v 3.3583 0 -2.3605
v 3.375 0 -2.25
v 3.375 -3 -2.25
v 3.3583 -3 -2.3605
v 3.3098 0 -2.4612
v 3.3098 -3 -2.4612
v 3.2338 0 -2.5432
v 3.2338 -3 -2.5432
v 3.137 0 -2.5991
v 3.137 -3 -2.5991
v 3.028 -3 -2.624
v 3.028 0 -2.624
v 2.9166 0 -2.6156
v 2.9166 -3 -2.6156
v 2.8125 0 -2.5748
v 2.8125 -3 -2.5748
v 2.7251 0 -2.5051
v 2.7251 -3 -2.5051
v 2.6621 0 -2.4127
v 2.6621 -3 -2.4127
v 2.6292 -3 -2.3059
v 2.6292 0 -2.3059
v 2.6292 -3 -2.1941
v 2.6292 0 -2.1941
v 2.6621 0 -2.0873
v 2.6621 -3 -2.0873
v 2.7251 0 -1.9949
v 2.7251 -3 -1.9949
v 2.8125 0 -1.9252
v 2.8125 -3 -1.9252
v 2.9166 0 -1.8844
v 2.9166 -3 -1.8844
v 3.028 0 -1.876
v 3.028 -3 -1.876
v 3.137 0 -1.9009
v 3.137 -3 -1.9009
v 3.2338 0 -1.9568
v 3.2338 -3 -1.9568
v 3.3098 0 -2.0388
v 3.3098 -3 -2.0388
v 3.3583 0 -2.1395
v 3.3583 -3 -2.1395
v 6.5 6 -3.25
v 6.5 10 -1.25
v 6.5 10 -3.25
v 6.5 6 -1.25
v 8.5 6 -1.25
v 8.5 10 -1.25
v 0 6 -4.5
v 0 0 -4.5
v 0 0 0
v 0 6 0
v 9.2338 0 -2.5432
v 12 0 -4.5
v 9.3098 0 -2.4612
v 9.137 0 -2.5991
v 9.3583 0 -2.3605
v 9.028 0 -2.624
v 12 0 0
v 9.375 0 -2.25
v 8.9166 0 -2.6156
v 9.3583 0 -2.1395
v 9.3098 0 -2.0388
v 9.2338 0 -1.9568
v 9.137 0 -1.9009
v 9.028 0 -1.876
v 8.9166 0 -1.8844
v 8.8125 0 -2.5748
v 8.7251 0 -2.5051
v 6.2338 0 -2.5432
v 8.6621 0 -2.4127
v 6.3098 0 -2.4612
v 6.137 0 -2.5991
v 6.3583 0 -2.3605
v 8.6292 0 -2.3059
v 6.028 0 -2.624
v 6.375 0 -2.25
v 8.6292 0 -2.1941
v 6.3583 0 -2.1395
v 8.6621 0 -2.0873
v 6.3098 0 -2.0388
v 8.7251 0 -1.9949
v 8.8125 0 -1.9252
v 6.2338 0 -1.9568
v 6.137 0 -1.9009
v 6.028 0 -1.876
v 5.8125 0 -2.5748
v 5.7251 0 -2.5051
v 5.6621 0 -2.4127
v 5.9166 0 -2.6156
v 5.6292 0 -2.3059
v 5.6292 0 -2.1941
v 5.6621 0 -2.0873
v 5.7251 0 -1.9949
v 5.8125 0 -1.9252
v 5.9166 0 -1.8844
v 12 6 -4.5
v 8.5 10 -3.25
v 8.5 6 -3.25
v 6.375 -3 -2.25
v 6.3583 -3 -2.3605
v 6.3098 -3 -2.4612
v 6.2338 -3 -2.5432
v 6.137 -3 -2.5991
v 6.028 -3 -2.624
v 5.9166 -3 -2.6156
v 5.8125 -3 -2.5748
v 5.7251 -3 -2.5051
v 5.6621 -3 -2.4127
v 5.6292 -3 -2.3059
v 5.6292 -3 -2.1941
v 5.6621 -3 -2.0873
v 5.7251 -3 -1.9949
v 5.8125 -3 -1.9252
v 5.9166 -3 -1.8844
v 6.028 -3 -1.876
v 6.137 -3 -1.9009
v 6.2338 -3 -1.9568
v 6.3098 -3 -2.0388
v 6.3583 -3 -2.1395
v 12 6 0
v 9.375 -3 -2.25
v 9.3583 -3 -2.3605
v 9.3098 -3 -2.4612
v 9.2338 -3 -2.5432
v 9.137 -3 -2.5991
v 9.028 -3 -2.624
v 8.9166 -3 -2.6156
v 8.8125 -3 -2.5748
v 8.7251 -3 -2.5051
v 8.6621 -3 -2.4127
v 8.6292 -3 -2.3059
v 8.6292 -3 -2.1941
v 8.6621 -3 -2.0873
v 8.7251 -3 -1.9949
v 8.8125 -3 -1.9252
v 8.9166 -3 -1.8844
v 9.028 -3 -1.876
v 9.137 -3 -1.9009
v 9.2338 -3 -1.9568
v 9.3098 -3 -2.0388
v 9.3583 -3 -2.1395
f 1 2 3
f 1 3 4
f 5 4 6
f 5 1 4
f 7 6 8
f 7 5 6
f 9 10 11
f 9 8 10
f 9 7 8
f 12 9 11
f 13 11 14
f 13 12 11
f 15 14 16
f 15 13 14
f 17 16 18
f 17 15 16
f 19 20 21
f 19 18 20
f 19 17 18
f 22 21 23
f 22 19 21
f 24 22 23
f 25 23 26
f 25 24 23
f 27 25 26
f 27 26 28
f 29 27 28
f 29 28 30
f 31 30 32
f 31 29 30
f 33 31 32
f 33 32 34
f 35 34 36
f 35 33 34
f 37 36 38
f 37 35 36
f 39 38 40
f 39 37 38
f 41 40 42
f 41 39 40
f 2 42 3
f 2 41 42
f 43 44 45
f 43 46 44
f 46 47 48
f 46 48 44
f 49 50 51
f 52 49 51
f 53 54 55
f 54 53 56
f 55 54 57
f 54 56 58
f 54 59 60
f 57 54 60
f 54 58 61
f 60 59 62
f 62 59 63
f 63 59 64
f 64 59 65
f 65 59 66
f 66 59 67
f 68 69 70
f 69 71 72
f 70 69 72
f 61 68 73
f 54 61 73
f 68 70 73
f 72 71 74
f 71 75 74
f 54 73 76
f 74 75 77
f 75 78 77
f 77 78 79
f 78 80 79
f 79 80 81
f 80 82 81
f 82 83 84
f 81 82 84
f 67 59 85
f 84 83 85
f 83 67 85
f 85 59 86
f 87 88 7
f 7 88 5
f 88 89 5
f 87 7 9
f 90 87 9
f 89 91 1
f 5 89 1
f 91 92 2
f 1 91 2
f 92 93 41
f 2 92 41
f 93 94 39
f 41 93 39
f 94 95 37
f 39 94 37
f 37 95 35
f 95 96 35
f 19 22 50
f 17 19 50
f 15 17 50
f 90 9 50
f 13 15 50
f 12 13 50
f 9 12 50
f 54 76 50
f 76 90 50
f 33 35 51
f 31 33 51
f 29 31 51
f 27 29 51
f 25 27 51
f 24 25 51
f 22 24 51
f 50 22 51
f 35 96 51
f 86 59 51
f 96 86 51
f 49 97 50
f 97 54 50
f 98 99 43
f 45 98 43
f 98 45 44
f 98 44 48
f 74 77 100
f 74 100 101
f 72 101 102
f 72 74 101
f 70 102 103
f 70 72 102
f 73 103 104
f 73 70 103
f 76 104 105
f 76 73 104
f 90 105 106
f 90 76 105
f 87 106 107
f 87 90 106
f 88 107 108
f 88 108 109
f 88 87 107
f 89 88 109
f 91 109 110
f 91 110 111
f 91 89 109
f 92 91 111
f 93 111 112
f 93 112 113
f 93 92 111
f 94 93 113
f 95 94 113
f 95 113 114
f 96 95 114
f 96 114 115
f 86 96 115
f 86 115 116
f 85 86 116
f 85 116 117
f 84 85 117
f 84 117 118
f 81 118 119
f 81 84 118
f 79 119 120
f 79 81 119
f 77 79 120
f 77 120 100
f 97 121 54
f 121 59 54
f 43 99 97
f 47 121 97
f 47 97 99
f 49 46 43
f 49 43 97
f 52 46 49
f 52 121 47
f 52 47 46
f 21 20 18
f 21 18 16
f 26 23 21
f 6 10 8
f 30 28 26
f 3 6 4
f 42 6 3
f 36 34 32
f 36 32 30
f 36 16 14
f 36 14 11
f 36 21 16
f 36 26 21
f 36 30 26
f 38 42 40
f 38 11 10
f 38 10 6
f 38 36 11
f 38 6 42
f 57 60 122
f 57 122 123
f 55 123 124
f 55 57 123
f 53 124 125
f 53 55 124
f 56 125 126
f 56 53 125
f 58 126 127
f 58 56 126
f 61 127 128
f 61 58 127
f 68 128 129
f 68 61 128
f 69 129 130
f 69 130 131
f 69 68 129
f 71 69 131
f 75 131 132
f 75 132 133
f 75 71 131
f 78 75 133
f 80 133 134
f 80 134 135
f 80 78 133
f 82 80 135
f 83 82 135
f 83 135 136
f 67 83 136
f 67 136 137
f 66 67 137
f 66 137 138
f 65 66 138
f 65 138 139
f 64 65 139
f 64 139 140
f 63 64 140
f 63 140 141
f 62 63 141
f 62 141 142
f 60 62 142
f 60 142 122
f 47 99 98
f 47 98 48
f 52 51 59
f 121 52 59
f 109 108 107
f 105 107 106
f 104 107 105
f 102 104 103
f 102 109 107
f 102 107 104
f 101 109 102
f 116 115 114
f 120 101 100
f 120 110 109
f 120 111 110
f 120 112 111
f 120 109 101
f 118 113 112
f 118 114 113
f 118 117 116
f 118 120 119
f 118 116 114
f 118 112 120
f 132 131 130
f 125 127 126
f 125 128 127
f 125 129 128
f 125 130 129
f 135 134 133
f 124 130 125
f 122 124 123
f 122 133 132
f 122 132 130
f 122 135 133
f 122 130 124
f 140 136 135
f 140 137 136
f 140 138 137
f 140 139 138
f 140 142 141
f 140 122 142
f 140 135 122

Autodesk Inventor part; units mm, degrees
ref_plane "YZ Plane" through (0, 0, 0) normal (1, 0, 0) x (0, 1, 0)
ref_plane "XZ Plane" through (0, 0, 0) normal (0, 1, 0) x (-1, 0, 0)
ref_plane "XY Plane" through (0, 0, 0) normal (0, 0, 1) x (1, 0, 0)
sketch "스케치4" plane through (0, 0, 0) normal (0, 1, 0) x (-1, 0, 0)
  line L0 (0, 0) -> (-12, 0)
  line L1 (-12, 0) -> (-12, -4.5)
  line L2 (-12, -4.5) -> (0, -4.5)
  line L3 (0, -4.5) -> (0, 0)
  dimension "d18" = 12
  dimension "d19" = 4.5
extrude "돌출5" add sketch "스케치4" along normal blind 6
sketch "스케치5" plane through (0, 6, 0) normal (0, 1, 0) x (1, 0, 0)
  line L0 (12, 0) -> (12, 4.5) projected
  line L1 (12, 2.25) -> (12, 3.25)
  line L2 (12, 3.25) -> (6.5, 3.25)
  line L3 (6.5, 3.25) -> (8.5, 3.25)
  line L4 (8.5, 3.25) -> (8.5, 1.25)
  line L5 (8.5, 1.25) -> (6.5, 1.25)
  line L6 (6.5, 1.25) -> (6.5, 3.25)
  point P0 (0, 0)
  dimension "d22" = 1
  dimension "d23" = 5.5
  dimension "d24" = 2
  dimension "d25" = 2
extrude "돌출6" add sketch "스케치5" along normal blind 4
sketch "스케치6" plane through (0, 0, 0) normal (0, -1, 0) x (1, 0, 0)
  line L0 (0, 0) -> (12, 0) projected
  line L1 (6, 0) -> (6, -2.25)
  line L2 (6, -2.25) -> (9, -2.25)
  line L3 (9, -2.25) -> (3, -2.25)
  circle A0 centre (6, -2.25) radius 0.375
  circle A1 centre (9, -2.25) radius 0.375
  circle A2 centre (3, -2.25) radius 0.375
  dimension "d28" = 2.25
  dimension "d29" = 3
  dimension "d30" = 6
  dimension "d31" = 0.75
  dimension "d32" = 0.75
  dimension "d33" = 0.75
extrude "돌출7" add sketch "스케치6" along normal blind 3
properties part number "tmdnlcl"
